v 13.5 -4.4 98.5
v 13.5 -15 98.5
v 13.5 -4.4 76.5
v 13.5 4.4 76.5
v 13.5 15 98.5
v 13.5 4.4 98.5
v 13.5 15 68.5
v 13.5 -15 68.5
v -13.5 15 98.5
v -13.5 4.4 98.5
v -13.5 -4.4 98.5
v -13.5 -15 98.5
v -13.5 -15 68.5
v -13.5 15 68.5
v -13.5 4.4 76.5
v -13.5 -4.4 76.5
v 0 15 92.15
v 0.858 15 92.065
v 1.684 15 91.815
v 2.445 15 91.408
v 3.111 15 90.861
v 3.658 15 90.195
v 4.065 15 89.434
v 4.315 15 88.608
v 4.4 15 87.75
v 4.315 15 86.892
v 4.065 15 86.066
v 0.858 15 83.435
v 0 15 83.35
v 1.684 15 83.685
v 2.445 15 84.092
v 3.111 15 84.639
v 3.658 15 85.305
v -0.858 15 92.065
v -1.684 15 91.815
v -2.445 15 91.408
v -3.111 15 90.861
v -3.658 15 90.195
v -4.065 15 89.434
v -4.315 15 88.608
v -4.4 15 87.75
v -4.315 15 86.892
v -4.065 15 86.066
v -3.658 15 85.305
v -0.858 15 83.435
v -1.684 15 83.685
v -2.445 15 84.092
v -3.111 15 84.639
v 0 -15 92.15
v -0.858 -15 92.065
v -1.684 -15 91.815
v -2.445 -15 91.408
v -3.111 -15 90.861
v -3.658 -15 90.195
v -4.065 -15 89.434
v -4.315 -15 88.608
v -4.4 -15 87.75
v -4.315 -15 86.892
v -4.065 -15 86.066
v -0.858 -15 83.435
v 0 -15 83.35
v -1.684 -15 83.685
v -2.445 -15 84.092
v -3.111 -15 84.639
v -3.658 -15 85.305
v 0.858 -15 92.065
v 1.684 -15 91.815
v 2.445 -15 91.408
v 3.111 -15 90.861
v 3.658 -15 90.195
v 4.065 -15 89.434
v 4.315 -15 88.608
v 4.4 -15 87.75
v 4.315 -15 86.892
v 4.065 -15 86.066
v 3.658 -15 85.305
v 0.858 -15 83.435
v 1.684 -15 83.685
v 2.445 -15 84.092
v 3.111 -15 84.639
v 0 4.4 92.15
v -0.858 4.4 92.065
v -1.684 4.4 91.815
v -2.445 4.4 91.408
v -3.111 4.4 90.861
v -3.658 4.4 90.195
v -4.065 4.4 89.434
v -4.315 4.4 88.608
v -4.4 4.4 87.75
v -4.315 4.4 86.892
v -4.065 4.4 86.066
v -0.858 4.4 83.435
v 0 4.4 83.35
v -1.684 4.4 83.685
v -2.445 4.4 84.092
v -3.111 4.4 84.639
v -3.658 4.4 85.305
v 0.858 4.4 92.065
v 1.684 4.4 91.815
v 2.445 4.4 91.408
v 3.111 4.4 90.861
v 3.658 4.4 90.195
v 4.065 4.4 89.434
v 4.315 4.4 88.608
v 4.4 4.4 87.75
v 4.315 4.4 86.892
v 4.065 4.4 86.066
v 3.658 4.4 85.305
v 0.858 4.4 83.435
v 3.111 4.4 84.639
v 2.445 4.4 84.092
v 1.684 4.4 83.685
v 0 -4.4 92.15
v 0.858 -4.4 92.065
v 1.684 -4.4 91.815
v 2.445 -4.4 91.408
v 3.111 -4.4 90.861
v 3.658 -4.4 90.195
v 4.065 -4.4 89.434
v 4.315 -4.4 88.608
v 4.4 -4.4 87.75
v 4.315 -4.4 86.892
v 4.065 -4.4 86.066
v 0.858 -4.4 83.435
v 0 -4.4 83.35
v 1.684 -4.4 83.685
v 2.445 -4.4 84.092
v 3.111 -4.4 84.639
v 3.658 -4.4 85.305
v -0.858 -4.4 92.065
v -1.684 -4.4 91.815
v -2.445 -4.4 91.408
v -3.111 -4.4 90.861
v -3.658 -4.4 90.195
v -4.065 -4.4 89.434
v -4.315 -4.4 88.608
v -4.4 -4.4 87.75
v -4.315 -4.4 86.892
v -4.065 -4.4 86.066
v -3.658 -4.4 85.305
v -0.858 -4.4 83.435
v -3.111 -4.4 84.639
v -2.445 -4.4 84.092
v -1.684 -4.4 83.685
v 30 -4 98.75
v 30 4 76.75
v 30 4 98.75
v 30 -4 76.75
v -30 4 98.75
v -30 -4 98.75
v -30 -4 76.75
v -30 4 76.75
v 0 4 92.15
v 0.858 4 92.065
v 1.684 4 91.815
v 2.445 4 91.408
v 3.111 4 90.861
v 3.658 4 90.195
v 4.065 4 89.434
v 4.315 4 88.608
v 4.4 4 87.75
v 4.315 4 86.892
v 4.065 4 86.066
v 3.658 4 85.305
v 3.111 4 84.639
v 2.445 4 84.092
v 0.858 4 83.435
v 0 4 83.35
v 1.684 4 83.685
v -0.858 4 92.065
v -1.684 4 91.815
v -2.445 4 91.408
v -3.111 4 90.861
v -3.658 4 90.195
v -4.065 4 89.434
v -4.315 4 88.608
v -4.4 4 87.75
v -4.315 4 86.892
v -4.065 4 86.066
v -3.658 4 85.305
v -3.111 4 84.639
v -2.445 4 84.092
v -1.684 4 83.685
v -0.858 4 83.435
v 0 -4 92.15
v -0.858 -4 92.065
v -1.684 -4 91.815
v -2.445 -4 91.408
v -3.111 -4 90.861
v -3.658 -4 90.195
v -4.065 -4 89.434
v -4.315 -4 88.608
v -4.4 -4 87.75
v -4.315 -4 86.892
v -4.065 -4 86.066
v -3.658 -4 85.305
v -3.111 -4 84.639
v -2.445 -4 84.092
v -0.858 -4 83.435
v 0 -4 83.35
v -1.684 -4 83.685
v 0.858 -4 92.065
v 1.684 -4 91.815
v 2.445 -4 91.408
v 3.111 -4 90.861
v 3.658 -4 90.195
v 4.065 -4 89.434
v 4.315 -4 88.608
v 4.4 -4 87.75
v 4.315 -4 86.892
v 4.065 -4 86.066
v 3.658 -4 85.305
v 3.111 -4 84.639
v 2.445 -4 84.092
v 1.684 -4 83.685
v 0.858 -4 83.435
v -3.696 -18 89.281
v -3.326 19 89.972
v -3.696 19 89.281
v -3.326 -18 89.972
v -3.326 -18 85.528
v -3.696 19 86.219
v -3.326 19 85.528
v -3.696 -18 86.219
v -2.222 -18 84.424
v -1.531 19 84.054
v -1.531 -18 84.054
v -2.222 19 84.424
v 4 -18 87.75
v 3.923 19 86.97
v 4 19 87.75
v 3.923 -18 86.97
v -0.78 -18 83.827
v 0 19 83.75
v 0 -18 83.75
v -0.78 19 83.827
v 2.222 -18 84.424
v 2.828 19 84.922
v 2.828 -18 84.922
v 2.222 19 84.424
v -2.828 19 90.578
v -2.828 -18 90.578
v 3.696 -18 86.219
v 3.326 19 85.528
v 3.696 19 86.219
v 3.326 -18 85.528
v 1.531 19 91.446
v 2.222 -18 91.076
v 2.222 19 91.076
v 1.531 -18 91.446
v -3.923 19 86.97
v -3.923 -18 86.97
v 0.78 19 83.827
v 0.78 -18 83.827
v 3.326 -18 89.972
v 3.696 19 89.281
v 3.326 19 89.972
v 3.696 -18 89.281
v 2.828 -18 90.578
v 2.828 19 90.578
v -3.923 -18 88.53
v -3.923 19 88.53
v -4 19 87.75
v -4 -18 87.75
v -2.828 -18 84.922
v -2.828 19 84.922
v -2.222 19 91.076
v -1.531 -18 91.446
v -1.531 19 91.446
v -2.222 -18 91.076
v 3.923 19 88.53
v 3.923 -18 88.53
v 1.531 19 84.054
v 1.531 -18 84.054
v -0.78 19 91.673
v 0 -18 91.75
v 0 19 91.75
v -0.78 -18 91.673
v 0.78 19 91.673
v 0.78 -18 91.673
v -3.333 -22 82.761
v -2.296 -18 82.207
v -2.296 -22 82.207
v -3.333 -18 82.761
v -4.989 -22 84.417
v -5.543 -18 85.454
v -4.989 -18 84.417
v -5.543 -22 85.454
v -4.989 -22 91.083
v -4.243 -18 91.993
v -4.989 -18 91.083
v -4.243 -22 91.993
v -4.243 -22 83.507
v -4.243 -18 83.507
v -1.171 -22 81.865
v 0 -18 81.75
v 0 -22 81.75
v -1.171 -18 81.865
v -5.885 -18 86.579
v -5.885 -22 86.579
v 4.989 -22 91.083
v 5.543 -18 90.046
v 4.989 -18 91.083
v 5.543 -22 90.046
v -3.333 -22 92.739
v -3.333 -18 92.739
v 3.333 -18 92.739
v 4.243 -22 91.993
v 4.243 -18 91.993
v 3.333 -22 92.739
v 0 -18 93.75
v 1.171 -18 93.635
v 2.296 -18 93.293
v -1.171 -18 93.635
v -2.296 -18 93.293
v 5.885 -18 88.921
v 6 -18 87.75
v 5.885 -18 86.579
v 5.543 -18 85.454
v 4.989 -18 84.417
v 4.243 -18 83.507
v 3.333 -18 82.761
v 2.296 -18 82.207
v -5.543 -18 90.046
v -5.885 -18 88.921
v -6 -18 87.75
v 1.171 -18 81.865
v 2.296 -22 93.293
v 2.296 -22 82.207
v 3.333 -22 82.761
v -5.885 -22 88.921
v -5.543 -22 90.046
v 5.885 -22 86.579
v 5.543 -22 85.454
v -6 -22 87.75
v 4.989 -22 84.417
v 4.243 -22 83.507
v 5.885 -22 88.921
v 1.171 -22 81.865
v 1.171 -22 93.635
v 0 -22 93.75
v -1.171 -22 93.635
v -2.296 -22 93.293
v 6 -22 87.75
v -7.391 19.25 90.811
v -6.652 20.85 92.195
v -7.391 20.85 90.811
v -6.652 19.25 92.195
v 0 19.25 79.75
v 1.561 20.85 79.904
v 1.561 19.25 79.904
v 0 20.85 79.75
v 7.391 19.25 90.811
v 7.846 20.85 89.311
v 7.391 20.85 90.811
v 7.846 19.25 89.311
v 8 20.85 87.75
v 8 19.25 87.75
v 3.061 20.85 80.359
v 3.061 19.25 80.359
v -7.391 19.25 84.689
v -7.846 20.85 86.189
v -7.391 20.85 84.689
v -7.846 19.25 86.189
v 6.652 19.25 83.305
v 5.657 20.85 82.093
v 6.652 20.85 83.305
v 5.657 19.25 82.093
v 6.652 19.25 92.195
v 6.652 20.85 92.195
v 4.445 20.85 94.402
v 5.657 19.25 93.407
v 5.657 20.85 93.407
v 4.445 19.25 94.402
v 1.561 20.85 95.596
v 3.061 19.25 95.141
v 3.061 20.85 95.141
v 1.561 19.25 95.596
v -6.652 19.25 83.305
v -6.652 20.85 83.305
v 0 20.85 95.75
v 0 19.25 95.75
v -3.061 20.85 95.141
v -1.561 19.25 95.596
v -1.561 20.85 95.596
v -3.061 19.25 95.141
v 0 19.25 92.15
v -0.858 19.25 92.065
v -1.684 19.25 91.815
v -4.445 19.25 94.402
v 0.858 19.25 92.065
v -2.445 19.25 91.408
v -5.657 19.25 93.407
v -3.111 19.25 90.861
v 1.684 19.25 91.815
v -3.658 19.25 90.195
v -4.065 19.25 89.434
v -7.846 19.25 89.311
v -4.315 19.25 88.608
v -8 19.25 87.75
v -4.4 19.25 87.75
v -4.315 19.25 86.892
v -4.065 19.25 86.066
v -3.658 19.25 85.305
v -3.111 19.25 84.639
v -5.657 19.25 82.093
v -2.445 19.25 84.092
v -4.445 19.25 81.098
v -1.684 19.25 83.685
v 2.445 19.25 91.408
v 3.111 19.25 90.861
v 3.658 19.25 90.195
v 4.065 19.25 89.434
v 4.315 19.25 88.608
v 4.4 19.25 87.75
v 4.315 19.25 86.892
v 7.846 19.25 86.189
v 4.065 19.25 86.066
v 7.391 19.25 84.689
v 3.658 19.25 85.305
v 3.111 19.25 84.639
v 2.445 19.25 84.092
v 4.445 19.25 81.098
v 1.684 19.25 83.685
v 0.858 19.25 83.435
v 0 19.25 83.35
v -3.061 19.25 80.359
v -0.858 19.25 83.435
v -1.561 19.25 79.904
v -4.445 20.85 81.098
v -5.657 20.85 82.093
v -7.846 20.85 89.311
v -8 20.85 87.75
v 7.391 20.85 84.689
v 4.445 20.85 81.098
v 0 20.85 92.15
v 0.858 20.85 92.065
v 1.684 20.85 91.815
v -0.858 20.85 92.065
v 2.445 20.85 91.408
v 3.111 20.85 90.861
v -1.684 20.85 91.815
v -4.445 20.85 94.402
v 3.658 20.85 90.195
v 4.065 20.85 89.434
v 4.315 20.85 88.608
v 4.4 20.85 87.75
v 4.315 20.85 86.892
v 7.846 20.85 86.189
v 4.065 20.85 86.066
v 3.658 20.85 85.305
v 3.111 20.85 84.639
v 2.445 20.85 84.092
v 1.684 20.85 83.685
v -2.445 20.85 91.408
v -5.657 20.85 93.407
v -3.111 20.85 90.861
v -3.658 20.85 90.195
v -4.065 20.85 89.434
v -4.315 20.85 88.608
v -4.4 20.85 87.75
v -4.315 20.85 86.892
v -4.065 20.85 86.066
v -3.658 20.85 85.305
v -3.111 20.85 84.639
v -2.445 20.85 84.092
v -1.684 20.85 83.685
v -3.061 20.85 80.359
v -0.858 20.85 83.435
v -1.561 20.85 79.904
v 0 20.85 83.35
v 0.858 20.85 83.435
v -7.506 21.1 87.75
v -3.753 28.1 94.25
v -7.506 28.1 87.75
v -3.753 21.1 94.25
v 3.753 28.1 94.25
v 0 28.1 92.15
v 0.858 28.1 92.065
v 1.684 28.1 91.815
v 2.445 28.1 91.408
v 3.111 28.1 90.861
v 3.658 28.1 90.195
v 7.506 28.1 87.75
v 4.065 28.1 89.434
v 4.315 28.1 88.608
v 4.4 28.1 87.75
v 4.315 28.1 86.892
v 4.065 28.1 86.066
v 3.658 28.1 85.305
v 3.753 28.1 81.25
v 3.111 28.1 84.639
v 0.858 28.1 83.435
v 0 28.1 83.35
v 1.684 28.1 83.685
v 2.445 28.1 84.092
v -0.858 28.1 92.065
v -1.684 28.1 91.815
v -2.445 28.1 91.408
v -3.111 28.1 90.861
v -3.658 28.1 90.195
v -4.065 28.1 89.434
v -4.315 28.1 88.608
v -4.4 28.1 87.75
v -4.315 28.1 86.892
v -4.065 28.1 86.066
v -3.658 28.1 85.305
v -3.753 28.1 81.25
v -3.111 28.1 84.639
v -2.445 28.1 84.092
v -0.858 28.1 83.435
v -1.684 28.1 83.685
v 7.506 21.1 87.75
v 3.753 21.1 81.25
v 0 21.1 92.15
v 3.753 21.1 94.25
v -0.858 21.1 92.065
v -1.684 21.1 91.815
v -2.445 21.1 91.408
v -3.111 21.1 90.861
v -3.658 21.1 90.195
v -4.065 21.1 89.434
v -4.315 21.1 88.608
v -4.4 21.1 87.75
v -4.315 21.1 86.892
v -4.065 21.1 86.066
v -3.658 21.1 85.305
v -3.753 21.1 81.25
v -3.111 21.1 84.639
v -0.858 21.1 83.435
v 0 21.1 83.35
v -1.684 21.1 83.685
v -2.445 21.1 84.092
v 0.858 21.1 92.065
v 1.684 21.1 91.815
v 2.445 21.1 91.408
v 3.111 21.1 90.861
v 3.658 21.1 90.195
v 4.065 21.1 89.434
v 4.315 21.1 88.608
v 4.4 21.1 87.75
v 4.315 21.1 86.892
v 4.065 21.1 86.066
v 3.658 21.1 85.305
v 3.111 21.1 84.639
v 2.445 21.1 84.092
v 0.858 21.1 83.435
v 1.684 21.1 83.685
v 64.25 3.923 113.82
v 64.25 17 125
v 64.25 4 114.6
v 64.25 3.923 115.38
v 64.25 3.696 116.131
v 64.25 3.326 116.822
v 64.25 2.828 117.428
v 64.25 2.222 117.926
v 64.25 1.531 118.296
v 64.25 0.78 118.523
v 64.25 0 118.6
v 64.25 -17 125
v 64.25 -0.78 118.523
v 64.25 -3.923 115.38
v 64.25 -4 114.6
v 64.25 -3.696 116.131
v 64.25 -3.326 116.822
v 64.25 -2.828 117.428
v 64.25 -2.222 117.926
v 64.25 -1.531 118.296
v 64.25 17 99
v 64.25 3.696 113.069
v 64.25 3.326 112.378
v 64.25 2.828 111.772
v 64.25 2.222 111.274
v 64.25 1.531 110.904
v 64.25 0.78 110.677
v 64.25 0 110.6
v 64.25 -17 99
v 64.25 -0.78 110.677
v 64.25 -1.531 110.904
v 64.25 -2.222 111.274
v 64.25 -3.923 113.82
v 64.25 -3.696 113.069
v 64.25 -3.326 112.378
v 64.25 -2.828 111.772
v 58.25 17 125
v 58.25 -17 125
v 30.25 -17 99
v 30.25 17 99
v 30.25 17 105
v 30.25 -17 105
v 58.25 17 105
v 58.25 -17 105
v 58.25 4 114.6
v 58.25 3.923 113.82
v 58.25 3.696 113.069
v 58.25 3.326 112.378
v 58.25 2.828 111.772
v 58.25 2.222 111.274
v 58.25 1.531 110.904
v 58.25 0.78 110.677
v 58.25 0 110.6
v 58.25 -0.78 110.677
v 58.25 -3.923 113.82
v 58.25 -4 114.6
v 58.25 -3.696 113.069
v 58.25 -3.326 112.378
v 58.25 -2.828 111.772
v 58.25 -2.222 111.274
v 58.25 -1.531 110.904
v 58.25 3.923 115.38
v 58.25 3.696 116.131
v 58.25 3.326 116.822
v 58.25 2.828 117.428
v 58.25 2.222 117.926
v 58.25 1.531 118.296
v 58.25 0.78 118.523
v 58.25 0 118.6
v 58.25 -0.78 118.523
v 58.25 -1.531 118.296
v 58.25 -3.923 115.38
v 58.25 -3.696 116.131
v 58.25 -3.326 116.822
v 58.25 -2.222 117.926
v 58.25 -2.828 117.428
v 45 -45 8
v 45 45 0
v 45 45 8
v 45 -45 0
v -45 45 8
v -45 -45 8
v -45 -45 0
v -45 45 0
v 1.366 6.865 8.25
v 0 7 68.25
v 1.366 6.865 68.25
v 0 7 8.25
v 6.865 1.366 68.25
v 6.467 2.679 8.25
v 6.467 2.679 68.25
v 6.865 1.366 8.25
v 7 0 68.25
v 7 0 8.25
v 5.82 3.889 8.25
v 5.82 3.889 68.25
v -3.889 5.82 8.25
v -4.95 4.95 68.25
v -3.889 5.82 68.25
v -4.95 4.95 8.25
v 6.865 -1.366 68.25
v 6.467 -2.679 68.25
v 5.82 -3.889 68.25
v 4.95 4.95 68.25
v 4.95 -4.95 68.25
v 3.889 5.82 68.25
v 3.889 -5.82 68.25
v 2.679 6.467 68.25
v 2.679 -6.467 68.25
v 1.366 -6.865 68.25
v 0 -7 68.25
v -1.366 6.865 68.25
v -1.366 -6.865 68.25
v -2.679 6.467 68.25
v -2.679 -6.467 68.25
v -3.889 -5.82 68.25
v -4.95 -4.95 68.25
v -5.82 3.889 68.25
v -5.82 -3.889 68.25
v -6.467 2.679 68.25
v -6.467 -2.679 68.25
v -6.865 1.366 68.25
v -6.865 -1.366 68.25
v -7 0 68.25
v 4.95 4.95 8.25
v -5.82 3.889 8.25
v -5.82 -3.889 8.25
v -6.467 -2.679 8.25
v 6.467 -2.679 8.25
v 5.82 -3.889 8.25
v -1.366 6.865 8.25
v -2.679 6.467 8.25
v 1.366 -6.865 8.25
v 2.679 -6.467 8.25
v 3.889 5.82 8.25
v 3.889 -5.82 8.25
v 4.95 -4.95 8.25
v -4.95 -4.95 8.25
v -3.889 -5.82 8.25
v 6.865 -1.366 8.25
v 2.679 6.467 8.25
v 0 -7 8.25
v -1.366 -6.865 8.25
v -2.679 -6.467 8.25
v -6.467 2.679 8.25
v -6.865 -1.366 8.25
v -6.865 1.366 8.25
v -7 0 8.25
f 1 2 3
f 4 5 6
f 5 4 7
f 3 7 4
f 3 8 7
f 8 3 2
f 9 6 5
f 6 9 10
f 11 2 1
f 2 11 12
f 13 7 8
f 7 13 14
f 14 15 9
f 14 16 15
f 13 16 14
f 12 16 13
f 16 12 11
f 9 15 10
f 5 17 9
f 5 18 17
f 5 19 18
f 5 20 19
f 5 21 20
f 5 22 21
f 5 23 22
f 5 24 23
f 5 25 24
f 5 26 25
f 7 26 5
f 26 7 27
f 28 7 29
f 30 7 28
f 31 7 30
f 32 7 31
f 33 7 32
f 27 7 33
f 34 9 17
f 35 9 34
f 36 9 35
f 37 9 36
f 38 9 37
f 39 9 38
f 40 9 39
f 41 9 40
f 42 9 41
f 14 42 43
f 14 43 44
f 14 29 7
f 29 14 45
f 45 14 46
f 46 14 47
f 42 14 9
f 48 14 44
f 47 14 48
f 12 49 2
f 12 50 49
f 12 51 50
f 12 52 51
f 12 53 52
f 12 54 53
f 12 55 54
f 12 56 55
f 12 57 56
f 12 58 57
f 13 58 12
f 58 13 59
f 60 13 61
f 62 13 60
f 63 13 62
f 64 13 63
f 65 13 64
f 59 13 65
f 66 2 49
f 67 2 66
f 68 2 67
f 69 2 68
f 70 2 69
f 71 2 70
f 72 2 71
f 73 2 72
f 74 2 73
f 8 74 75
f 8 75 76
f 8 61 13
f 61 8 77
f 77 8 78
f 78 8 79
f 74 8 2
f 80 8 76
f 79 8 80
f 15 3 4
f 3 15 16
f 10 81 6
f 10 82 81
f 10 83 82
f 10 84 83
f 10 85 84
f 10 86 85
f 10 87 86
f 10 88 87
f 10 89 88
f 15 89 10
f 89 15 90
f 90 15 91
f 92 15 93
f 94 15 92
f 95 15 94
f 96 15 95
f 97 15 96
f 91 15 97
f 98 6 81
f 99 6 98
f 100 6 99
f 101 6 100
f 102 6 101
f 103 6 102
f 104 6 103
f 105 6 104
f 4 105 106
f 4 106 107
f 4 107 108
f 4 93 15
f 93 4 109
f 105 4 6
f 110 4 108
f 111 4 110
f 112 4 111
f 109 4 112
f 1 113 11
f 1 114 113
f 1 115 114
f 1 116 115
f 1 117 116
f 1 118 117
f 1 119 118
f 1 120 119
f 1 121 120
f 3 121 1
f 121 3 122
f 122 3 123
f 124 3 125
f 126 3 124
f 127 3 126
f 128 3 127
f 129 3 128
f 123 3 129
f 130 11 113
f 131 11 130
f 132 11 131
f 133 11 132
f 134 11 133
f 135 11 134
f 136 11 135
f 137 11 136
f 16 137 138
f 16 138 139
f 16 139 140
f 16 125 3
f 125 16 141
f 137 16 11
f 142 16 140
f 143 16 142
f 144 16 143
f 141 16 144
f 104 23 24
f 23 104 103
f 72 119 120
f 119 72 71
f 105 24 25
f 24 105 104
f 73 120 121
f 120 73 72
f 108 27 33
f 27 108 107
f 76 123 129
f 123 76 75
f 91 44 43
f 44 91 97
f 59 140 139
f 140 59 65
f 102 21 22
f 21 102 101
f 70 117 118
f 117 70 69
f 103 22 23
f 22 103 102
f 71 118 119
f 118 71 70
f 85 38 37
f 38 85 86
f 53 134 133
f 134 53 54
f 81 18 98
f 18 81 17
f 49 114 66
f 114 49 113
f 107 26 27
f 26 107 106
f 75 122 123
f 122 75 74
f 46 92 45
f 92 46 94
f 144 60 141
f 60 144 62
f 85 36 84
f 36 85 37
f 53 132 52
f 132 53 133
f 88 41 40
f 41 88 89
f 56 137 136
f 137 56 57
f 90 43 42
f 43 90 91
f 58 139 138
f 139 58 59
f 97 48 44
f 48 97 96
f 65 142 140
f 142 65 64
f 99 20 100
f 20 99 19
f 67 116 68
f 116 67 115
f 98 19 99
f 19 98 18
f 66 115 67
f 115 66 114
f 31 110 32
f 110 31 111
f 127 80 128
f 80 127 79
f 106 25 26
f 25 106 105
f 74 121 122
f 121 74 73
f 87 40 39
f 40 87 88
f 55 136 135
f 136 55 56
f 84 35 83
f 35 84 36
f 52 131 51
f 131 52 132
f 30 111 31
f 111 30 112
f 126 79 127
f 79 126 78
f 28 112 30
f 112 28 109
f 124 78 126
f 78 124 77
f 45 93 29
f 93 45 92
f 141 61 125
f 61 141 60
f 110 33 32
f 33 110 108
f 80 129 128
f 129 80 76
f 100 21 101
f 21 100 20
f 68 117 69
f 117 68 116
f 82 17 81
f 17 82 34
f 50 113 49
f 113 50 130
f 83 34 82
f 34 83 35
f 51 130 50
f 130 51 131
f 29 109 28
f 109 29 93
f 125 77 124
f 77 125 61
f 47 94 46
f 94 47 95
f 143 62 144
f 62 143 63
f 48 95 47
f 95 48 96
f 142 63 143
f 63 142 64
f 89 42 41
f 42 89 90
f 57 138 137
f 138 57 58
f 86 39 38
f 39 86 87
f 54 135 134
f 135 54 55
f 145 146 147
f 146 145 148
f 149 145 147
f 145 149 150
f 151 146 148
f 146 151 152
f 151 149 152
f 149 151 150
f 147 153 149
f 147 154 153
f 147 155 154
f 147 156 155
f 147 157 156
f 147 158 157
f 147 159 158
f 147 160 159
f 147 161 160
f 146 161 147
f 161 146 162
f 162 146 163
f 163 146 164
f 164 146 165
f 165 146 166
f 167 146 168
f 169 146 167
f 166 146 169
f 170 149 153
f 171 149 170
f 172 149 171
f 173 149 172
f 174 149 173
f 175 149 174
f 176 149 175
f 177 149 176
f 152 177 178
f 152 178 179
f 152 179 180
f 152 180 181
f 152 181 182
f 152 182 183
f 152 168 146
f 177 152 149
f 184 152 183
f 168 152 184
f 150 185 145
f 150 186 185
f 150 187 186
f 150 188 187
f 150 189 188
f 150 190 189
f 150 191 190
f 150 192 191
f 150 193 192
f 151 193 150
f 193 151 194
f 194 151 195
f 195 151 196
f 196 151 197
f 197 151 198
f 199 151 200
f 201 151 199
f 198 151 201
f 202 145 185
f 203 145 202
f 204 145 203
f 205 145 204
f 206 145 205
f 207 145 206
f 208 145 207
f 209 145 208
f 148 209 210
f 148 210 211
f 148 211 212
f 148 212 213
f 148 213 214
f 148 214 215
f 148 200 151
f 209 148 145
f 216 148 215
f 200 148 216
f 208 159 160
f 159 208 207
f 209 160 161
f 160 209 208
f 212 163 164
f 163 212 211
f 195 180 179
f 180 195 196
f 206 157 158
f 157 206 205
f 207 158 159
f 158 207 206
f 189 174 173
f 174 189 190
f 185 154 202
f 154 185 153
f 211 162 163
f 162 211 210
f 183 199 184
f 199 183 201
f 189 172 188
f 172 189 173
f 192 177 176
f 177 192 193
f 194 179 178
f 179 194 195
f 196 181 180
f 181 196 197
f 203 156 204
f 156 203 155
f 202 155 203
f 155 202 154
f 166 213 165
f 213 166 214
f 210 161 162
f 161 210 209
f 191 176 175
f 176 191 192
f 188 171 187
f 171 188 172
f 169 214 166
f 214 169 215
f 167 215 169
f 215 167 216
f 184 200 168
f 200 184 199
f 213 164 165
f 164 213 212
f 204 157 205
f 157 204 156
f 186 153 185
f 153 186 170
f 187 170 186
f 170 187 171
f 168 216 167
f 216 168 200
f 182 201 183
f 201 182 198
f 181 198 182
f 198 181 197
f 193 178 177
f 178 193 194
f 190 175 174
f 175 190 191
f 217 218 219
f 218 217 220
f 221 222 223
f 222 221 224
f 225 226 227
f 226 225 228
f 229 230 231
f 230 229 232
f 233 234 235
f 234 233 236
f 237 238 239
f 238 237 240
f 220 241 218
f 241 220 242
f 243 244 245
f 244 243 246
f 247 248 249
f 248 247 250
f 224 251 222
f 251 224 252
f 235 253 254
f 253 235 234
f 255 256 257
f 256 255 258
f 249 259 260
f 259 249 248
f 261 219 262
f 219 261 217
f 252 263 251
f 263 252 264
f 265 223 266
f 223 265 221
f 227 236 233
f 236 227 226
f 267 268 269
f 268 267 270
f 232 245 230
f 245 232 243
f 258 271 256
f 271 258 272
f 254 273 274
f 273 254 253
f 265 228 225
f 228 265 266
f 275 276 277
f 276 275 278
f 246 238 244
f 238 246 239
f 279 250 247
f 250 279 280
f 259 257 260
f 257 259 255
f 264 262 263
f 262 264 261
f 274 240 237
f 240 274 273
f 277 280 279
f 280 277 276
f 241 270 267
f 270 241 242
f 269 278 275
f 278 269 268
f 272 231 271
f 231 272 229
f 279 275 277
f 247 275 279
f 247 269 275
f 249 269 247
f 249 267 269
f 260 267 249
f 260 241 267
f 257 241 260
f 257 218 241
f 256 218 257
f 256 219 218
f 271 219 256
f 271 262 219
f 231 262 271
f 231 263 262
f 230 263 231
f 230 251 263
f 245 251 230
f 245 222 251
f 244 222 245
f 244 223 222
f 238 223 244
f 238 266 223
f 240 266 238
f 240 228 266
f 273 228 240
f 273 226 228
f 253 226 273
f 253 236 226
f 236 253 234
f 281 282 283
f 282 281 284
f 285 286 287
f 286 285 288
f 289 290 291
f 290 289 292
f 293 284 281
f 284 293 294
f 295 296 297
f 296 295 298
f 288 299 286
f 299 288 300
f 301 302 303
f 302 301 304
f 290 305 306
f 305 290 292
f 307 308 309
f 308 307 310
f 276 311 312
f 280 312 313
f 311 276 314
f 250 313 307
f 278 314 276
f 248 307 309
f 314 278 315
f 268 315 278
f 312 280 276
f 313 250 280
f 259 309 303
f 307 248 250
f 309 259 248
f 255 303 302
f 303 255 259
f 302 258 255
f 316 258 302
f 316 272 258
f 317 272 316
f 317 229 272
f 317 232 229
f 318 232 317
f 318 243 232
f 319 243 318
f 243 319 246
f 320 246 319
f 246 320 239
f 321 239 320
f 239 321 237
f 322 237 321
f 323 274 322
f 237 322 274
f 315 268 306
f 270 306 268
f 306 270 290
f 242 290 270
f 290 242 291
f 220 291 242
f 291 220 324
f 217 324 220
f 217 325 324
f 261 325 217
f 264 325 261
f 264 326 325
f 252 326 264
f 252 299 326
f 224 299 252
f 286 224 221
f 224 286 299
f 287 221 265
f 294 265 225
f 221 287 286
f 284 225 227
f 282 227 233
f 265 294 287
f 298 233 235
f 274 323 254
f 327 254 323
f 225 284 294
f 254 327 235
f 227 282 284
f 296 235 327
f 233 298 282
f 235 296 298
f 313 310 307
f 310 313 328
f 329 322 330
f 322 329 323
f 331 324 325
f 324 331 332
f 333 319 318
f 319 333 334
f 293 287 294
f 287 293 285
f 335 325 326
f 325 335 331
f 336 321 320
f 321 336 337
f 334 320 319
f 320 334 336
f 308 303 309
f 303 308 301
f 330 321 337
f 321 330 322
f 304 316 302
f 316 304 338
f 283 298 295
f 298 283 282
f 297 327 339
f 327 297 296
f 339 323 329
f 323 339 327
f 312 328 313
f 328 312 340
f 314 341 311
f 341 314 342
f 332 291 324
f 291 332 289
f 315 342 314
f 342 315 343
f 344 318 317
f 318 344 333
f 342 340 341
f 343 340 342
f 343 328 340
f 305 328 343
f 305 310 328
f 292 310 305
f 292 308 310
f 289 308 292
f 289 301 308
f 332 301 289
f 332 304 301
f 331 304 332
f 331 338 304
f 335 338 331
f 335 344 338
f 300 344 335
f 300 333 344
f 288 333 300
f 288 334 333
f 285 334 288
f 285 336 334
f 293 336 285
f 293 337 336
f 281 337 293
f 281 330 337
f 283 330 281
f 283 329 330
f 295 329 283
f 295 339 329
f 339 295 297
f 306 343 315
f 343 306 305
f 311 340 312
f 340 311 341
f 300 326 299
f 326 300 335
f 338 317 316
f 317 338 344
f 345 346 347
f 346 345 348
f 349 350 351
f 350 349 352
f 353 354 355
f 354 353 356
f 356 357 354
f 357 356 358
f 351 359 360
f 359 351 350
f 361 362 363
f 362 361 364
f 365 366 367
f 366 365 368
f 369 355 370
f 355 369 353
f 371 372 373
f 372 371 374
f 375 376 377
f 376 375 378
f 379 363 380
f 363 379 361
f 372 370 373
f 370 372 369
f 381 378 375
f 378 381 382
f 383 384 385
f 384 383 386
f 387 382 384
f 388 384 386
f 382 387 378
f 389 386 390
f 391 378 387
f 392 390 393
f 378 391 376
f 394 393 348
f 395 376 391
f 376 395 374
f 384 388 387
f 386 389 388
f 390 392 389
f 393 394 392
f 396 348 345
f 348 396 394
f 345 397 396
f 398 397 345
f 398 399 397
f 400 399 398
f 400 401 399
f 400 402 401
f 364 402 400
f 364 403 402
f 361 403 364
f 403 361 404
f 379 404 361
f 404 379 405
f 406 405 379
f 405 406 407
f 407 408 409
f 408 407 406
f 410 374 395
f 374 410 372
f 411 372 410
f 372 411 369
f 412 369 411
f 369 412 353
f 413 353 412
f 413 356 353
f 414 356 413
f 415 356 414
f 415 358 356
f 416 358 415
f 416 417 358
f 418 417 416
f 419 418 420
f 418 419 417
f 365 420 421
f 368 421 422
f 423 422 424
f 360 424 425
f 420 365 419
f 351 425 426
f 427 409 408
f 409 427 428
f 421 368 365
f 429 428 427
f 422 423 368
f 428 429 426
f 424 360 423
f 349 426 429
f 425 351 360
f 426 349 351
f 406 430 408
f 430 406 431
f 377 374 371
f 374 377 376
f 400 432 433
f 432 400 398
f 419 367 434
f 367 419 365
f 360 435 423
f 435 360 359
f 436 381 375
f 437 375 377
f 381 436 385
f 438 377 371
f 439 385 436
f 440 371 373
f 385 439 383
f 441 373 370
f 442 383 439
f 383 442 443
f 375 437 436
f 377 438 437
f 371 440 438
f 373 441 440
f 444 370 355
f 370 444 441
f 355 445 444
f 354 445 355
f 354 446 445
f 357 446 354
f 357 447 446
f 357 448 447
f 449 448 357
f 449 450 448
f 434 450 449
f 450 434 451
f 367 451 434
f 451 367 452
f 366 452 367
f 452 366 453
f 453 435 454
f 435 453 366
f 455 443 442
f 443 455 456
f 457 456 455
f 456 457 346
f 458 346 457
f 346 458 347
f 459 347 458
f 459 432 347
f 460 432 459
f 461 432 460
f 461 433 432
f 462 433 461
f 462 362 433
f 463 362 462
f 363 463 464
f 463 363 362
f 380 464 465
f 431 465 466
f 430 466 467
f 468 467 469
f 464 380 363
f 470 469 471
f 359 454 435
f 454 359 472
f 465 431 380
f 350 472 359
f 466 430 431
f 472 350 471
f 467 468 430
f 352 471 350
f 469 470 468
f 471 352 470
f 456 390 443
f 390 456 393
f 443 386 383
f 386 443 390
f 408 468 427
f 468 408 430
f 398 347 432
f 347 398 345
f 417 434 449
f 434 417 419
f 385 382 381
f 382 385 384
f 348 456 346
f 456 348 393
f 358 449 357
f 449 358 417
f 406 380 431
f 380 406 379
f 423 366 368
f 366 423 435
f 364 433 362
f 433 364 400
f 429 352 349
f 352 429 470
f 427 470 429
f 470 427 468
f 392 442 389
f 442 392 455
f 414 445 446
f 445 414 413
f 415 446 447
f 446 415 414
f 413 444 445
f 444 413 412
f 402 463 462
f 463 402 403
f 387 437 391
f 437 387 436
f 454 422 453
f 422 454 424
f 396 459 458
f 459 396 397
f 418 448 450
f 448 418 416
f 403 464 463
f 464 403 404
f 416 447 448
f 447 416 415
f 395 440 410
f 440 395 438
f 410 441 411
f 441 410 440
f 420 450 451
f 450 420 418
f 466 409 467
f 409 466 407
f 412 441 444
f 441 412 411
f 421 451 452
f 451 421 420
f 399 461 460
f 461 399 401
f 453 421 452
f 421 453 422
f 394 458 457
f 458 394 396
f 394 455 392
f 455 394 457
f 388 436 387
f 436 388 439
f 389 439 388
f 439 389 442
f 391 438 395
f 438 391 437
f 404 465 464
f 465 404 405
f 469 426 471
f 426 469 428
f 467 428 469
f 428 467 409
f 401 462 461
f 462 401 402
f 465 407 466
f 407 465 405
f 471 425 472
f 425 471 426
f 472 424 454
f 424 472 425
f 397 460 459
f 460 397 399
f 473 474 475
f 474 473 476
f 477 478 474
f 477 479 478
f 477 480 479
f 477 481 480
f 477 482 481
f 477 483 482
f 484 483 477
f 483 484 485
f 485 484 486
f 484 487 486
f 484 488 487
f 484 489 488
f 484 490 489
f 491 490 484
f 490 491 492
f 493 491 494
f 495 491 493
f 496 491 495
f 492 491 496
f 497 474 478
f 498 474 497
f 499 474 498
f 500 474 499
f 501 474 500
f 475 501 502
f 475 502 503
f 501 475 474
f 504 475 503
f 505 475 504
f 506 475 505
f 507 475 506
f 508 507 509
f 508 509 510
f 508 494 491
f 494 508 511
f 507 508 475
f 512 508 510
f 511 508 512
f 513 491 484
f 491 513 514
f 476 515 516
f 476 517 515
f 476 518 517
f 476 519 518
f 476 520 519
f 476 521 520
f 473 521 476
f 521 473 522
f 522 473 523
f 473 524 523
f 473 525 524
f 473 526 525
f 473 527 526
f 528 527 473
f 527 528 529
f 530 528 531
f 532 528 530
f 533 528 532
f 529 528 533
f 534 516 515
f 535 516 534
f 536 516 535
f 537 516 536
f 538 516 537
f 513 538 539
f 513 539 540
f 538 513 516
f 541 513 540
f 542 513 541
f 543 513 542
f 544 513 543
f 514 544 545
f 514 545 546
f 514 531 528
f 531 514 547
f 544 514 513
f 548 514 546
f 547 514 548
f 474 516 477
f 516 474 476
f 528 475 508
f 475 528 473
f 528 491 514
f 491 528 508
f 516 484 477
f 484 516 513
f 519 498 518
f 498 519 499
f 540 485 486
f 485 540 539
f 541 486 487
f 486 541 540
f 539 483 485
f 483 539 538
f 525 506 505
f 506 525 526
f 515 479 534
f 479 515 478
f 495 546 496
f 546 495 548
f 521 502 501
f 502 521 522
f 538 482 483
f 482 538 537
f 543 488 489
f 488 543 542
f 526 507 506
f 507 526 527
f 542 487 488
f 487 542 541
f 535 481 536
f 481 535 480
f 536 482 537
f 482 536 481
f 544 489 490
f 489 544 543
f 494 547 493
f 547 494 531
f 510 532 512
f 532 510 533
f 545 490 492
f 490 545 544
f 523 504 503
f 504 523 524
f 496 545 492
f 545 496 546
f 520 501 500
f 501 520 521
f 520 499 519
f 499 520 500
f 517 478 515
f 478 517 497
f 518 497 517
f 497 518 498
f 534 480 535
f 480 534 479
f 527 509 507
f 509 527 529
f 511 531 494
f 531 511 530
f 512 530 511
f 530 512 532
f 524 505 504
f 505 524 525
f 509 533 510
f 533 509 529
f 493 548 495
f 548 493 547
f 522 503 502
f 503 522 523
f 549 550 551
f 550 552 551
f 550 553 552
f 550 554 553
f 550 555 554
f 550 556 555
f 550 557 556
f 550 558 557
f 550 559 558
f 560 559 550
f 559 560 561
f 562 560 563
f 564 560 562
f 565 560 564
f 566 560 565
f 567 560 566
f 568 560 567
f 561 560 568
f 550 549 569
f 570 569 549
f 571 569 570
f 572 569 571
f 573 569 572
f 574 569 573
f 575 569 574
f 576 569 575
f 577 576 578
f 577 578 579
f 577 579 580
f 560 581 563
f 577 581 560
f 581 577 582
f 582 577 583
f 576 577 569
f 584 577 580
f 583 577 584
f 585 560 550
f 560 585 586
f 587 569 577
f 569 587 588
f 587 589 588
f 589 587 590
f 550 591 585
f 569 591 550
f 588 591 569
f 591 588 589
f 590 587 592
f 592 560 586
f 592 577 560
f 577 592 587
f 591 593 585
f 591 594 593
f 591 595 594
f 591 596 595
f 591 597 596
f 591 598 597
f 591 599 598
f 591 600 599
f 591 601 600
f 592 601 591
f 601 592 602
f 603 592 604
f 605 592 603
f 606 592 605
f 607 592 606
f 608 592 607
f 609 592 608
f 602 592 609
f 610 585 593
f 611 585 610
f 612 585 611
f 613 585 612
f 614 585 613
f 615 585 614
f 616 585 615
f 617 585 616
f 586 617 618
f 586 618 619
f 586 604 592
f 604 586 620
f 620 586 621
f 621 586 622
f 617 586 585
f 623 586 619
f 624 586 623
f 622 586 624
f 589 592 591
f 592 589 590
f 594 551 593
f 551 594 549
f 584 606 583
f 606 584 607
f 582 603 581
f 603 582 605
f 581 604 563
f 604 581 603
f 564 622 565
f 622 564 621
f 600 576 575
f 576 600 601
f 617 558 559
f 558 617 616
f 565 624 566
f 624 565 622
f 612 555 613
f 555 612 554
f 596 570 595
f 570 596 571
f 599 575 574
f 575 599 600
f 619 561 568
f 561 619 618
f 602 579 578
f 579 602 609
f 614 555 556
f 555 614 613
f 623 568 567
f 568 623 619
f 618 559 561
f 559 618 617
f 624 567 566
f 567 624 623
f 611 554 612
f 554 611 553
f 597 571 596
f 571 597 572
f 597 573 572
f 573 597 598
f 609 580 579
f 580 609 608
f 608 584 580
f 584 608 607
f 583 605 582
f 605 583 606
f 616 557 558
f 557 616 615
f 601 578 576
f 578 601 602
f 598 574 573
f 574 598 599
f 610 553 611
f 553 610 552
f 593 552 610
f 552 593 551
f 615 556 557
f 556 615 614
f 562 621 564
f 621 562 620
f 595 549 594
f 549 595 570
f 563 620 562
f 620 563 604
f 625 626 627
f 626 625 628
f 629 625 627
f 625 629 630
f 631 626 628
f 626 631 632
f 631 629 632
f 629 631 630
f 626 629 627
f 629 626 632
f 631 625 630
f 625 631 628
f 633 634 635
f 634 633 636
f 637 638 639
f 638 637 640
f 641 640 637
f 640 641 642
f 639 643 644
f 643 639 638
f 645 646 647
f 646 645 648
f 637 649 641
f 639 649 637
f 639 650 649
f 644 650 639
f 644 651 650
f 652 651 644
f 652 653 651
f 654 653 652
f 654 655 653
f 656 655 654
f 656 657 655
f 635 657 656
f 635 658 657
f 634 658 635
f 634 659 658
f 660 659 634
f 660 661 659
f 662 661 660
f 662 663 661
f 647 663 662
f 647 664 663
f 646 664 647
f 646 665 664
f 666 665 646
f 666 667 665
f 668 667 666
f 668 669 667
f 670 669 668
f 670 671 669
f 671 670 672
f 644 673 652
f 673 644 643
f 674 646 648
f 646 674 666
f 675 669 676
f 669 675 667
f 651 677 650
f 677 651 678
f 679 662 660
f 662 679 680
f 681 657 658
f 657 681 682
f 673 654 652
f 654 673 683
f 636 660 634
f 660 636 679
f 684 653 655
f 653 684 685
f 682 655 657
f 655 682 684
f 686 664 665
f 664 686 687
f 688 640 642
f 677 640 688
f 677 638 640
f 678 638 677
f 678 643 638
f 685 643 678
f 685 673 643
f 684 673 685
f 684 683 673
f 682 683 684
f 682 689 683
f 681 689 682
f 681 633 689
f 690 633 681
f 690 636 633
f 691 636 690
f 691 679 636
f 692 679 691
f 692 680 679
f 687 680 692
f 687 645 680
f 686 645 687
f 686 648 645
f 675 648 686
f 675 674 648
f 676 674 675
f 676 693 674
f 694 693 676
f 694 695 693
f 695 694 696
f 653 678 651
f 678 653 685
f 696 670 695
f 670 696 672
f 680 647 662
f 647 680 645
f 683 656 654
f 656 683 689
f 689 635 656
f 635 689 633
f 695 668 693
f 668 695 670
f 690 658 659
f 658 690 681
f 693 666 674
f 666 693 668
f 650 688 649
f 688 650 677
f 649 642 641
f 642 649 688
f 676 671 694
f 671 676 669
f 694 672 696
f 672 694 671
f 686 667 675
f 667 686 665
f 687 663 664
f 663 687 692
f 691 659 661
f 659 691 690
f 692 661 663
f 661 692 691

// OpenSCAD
$fn = 32;

// ------------------------------------------------------------------------
// Lamp arm: column d14 x 60 mm, arm 60 mm
// Every part is its own module, assembly() places every instance.
// ------------------------------------------------------------------------

// --- part 1 ---
module lamp_base() {
  difference() {
    translate([-45, -45, 0]) cube([90, 90, 8]);
  }
}

// --- part 2 ---
module lamp_column() {
  cylinder(h = 60, d = 14);
}

// --- part 3 ---
module head_fork() {
  difference() {
    translate([-13.5, -15, 0]) cube([27, 30, 30]);
    translate([-14.5, -4.4, 8]) cube([29, 8.8, 23]);
    translate([0, 0, 19.25]) rotate([90, 0, 0]) cylinder(h = 32, d = 8.8, center = true);
  }
}

// --- part 4 ---
module lamp_arm() {
  difference() {
    translate([-30, -4, 0]) cube([60, 8, 22]);
    translate([0, 0, 11]) rotate([90, 0, 0]) cylinder(h = 10, d = 8.8, center = true);
  }
}

// --- part 5 ---
module arm_pin() {
  rotate([0, 90, 0]) cylinder(h = 38, d = 8, center = true);
  translate([-22, 0, 0]) rotate([0, 90, 0]) cylinder(h = 4, d = 12);
}

// --- part 6 ---
module arm_washer() {
  difference() {
      translate([0, 0, 0]) cylinder(h = 1.6, d = 16);
      translate([0, 0, -1]) cylinder(h = 3.6, d = 8.8);
    }
}

// --- part 7 ---
module arm_nut() {
  difference() {
    linear_extrude(height = 7) polygon(points = [[7.506, 0], [3.753, 6.5], [-3.753, 6.5], [-7.506, 0], [-3.753, -6.5], [3.753, -6.5]]);
    translate([0, 0, -1]) cylinder(h = 9, d = 8.8);
  }
}

// --- part 8 ---
module shade_bracket() {
  difference() {
    translate([-17, -17, 0]) cube([34, 34, 26]);
    translate([-18, -18, 6]) cube([29, 36, 21]);
    translate([14, 0, 15.6]) rotate([0, 90, 0]) cylinder(h = 8, d = 8, center = true);
  }
}

// --- assembly ---
module assembly() {
  color([0.80, 0.24, 0.20]) translate([0, 0, 0]) rotate([0, 0, 0]) lamp_base();
  color([0.20, 0.45, 0.75]) translate([0, 0, 8.25]) rotate([0, 0, 0]) lamp_column();
  color([0.25, 0.62, 0.32]) translate([0, 0, 68.5]) rotate([0, 0, 0]) head_fork();
  color([0.92, 0.70, 0.18]) translate([0, 0, 76.75]) rotate([0, 0, 0]) lamp_arm();
  color([0.58, 0.35, 0.70]) translate([0, 0, 87.75]) rotate([0, 0, 90]) arm_pin();
  color([0.16, 0.66, 0.66]) translate([0, 20.85, 87.75]) rotate([90, 0, 0]) arm_washer();
  color([0.85, 0.48, 0.18]) translate([0, 28.1, 87.75]) rotate([90, 0, 0]) arm_nut();
  color([0.55, 0.60, 0.65]) translate([47.25, 0, 99]) rotate([0, 0, 0]) shade_bracket();
}

assembly();
